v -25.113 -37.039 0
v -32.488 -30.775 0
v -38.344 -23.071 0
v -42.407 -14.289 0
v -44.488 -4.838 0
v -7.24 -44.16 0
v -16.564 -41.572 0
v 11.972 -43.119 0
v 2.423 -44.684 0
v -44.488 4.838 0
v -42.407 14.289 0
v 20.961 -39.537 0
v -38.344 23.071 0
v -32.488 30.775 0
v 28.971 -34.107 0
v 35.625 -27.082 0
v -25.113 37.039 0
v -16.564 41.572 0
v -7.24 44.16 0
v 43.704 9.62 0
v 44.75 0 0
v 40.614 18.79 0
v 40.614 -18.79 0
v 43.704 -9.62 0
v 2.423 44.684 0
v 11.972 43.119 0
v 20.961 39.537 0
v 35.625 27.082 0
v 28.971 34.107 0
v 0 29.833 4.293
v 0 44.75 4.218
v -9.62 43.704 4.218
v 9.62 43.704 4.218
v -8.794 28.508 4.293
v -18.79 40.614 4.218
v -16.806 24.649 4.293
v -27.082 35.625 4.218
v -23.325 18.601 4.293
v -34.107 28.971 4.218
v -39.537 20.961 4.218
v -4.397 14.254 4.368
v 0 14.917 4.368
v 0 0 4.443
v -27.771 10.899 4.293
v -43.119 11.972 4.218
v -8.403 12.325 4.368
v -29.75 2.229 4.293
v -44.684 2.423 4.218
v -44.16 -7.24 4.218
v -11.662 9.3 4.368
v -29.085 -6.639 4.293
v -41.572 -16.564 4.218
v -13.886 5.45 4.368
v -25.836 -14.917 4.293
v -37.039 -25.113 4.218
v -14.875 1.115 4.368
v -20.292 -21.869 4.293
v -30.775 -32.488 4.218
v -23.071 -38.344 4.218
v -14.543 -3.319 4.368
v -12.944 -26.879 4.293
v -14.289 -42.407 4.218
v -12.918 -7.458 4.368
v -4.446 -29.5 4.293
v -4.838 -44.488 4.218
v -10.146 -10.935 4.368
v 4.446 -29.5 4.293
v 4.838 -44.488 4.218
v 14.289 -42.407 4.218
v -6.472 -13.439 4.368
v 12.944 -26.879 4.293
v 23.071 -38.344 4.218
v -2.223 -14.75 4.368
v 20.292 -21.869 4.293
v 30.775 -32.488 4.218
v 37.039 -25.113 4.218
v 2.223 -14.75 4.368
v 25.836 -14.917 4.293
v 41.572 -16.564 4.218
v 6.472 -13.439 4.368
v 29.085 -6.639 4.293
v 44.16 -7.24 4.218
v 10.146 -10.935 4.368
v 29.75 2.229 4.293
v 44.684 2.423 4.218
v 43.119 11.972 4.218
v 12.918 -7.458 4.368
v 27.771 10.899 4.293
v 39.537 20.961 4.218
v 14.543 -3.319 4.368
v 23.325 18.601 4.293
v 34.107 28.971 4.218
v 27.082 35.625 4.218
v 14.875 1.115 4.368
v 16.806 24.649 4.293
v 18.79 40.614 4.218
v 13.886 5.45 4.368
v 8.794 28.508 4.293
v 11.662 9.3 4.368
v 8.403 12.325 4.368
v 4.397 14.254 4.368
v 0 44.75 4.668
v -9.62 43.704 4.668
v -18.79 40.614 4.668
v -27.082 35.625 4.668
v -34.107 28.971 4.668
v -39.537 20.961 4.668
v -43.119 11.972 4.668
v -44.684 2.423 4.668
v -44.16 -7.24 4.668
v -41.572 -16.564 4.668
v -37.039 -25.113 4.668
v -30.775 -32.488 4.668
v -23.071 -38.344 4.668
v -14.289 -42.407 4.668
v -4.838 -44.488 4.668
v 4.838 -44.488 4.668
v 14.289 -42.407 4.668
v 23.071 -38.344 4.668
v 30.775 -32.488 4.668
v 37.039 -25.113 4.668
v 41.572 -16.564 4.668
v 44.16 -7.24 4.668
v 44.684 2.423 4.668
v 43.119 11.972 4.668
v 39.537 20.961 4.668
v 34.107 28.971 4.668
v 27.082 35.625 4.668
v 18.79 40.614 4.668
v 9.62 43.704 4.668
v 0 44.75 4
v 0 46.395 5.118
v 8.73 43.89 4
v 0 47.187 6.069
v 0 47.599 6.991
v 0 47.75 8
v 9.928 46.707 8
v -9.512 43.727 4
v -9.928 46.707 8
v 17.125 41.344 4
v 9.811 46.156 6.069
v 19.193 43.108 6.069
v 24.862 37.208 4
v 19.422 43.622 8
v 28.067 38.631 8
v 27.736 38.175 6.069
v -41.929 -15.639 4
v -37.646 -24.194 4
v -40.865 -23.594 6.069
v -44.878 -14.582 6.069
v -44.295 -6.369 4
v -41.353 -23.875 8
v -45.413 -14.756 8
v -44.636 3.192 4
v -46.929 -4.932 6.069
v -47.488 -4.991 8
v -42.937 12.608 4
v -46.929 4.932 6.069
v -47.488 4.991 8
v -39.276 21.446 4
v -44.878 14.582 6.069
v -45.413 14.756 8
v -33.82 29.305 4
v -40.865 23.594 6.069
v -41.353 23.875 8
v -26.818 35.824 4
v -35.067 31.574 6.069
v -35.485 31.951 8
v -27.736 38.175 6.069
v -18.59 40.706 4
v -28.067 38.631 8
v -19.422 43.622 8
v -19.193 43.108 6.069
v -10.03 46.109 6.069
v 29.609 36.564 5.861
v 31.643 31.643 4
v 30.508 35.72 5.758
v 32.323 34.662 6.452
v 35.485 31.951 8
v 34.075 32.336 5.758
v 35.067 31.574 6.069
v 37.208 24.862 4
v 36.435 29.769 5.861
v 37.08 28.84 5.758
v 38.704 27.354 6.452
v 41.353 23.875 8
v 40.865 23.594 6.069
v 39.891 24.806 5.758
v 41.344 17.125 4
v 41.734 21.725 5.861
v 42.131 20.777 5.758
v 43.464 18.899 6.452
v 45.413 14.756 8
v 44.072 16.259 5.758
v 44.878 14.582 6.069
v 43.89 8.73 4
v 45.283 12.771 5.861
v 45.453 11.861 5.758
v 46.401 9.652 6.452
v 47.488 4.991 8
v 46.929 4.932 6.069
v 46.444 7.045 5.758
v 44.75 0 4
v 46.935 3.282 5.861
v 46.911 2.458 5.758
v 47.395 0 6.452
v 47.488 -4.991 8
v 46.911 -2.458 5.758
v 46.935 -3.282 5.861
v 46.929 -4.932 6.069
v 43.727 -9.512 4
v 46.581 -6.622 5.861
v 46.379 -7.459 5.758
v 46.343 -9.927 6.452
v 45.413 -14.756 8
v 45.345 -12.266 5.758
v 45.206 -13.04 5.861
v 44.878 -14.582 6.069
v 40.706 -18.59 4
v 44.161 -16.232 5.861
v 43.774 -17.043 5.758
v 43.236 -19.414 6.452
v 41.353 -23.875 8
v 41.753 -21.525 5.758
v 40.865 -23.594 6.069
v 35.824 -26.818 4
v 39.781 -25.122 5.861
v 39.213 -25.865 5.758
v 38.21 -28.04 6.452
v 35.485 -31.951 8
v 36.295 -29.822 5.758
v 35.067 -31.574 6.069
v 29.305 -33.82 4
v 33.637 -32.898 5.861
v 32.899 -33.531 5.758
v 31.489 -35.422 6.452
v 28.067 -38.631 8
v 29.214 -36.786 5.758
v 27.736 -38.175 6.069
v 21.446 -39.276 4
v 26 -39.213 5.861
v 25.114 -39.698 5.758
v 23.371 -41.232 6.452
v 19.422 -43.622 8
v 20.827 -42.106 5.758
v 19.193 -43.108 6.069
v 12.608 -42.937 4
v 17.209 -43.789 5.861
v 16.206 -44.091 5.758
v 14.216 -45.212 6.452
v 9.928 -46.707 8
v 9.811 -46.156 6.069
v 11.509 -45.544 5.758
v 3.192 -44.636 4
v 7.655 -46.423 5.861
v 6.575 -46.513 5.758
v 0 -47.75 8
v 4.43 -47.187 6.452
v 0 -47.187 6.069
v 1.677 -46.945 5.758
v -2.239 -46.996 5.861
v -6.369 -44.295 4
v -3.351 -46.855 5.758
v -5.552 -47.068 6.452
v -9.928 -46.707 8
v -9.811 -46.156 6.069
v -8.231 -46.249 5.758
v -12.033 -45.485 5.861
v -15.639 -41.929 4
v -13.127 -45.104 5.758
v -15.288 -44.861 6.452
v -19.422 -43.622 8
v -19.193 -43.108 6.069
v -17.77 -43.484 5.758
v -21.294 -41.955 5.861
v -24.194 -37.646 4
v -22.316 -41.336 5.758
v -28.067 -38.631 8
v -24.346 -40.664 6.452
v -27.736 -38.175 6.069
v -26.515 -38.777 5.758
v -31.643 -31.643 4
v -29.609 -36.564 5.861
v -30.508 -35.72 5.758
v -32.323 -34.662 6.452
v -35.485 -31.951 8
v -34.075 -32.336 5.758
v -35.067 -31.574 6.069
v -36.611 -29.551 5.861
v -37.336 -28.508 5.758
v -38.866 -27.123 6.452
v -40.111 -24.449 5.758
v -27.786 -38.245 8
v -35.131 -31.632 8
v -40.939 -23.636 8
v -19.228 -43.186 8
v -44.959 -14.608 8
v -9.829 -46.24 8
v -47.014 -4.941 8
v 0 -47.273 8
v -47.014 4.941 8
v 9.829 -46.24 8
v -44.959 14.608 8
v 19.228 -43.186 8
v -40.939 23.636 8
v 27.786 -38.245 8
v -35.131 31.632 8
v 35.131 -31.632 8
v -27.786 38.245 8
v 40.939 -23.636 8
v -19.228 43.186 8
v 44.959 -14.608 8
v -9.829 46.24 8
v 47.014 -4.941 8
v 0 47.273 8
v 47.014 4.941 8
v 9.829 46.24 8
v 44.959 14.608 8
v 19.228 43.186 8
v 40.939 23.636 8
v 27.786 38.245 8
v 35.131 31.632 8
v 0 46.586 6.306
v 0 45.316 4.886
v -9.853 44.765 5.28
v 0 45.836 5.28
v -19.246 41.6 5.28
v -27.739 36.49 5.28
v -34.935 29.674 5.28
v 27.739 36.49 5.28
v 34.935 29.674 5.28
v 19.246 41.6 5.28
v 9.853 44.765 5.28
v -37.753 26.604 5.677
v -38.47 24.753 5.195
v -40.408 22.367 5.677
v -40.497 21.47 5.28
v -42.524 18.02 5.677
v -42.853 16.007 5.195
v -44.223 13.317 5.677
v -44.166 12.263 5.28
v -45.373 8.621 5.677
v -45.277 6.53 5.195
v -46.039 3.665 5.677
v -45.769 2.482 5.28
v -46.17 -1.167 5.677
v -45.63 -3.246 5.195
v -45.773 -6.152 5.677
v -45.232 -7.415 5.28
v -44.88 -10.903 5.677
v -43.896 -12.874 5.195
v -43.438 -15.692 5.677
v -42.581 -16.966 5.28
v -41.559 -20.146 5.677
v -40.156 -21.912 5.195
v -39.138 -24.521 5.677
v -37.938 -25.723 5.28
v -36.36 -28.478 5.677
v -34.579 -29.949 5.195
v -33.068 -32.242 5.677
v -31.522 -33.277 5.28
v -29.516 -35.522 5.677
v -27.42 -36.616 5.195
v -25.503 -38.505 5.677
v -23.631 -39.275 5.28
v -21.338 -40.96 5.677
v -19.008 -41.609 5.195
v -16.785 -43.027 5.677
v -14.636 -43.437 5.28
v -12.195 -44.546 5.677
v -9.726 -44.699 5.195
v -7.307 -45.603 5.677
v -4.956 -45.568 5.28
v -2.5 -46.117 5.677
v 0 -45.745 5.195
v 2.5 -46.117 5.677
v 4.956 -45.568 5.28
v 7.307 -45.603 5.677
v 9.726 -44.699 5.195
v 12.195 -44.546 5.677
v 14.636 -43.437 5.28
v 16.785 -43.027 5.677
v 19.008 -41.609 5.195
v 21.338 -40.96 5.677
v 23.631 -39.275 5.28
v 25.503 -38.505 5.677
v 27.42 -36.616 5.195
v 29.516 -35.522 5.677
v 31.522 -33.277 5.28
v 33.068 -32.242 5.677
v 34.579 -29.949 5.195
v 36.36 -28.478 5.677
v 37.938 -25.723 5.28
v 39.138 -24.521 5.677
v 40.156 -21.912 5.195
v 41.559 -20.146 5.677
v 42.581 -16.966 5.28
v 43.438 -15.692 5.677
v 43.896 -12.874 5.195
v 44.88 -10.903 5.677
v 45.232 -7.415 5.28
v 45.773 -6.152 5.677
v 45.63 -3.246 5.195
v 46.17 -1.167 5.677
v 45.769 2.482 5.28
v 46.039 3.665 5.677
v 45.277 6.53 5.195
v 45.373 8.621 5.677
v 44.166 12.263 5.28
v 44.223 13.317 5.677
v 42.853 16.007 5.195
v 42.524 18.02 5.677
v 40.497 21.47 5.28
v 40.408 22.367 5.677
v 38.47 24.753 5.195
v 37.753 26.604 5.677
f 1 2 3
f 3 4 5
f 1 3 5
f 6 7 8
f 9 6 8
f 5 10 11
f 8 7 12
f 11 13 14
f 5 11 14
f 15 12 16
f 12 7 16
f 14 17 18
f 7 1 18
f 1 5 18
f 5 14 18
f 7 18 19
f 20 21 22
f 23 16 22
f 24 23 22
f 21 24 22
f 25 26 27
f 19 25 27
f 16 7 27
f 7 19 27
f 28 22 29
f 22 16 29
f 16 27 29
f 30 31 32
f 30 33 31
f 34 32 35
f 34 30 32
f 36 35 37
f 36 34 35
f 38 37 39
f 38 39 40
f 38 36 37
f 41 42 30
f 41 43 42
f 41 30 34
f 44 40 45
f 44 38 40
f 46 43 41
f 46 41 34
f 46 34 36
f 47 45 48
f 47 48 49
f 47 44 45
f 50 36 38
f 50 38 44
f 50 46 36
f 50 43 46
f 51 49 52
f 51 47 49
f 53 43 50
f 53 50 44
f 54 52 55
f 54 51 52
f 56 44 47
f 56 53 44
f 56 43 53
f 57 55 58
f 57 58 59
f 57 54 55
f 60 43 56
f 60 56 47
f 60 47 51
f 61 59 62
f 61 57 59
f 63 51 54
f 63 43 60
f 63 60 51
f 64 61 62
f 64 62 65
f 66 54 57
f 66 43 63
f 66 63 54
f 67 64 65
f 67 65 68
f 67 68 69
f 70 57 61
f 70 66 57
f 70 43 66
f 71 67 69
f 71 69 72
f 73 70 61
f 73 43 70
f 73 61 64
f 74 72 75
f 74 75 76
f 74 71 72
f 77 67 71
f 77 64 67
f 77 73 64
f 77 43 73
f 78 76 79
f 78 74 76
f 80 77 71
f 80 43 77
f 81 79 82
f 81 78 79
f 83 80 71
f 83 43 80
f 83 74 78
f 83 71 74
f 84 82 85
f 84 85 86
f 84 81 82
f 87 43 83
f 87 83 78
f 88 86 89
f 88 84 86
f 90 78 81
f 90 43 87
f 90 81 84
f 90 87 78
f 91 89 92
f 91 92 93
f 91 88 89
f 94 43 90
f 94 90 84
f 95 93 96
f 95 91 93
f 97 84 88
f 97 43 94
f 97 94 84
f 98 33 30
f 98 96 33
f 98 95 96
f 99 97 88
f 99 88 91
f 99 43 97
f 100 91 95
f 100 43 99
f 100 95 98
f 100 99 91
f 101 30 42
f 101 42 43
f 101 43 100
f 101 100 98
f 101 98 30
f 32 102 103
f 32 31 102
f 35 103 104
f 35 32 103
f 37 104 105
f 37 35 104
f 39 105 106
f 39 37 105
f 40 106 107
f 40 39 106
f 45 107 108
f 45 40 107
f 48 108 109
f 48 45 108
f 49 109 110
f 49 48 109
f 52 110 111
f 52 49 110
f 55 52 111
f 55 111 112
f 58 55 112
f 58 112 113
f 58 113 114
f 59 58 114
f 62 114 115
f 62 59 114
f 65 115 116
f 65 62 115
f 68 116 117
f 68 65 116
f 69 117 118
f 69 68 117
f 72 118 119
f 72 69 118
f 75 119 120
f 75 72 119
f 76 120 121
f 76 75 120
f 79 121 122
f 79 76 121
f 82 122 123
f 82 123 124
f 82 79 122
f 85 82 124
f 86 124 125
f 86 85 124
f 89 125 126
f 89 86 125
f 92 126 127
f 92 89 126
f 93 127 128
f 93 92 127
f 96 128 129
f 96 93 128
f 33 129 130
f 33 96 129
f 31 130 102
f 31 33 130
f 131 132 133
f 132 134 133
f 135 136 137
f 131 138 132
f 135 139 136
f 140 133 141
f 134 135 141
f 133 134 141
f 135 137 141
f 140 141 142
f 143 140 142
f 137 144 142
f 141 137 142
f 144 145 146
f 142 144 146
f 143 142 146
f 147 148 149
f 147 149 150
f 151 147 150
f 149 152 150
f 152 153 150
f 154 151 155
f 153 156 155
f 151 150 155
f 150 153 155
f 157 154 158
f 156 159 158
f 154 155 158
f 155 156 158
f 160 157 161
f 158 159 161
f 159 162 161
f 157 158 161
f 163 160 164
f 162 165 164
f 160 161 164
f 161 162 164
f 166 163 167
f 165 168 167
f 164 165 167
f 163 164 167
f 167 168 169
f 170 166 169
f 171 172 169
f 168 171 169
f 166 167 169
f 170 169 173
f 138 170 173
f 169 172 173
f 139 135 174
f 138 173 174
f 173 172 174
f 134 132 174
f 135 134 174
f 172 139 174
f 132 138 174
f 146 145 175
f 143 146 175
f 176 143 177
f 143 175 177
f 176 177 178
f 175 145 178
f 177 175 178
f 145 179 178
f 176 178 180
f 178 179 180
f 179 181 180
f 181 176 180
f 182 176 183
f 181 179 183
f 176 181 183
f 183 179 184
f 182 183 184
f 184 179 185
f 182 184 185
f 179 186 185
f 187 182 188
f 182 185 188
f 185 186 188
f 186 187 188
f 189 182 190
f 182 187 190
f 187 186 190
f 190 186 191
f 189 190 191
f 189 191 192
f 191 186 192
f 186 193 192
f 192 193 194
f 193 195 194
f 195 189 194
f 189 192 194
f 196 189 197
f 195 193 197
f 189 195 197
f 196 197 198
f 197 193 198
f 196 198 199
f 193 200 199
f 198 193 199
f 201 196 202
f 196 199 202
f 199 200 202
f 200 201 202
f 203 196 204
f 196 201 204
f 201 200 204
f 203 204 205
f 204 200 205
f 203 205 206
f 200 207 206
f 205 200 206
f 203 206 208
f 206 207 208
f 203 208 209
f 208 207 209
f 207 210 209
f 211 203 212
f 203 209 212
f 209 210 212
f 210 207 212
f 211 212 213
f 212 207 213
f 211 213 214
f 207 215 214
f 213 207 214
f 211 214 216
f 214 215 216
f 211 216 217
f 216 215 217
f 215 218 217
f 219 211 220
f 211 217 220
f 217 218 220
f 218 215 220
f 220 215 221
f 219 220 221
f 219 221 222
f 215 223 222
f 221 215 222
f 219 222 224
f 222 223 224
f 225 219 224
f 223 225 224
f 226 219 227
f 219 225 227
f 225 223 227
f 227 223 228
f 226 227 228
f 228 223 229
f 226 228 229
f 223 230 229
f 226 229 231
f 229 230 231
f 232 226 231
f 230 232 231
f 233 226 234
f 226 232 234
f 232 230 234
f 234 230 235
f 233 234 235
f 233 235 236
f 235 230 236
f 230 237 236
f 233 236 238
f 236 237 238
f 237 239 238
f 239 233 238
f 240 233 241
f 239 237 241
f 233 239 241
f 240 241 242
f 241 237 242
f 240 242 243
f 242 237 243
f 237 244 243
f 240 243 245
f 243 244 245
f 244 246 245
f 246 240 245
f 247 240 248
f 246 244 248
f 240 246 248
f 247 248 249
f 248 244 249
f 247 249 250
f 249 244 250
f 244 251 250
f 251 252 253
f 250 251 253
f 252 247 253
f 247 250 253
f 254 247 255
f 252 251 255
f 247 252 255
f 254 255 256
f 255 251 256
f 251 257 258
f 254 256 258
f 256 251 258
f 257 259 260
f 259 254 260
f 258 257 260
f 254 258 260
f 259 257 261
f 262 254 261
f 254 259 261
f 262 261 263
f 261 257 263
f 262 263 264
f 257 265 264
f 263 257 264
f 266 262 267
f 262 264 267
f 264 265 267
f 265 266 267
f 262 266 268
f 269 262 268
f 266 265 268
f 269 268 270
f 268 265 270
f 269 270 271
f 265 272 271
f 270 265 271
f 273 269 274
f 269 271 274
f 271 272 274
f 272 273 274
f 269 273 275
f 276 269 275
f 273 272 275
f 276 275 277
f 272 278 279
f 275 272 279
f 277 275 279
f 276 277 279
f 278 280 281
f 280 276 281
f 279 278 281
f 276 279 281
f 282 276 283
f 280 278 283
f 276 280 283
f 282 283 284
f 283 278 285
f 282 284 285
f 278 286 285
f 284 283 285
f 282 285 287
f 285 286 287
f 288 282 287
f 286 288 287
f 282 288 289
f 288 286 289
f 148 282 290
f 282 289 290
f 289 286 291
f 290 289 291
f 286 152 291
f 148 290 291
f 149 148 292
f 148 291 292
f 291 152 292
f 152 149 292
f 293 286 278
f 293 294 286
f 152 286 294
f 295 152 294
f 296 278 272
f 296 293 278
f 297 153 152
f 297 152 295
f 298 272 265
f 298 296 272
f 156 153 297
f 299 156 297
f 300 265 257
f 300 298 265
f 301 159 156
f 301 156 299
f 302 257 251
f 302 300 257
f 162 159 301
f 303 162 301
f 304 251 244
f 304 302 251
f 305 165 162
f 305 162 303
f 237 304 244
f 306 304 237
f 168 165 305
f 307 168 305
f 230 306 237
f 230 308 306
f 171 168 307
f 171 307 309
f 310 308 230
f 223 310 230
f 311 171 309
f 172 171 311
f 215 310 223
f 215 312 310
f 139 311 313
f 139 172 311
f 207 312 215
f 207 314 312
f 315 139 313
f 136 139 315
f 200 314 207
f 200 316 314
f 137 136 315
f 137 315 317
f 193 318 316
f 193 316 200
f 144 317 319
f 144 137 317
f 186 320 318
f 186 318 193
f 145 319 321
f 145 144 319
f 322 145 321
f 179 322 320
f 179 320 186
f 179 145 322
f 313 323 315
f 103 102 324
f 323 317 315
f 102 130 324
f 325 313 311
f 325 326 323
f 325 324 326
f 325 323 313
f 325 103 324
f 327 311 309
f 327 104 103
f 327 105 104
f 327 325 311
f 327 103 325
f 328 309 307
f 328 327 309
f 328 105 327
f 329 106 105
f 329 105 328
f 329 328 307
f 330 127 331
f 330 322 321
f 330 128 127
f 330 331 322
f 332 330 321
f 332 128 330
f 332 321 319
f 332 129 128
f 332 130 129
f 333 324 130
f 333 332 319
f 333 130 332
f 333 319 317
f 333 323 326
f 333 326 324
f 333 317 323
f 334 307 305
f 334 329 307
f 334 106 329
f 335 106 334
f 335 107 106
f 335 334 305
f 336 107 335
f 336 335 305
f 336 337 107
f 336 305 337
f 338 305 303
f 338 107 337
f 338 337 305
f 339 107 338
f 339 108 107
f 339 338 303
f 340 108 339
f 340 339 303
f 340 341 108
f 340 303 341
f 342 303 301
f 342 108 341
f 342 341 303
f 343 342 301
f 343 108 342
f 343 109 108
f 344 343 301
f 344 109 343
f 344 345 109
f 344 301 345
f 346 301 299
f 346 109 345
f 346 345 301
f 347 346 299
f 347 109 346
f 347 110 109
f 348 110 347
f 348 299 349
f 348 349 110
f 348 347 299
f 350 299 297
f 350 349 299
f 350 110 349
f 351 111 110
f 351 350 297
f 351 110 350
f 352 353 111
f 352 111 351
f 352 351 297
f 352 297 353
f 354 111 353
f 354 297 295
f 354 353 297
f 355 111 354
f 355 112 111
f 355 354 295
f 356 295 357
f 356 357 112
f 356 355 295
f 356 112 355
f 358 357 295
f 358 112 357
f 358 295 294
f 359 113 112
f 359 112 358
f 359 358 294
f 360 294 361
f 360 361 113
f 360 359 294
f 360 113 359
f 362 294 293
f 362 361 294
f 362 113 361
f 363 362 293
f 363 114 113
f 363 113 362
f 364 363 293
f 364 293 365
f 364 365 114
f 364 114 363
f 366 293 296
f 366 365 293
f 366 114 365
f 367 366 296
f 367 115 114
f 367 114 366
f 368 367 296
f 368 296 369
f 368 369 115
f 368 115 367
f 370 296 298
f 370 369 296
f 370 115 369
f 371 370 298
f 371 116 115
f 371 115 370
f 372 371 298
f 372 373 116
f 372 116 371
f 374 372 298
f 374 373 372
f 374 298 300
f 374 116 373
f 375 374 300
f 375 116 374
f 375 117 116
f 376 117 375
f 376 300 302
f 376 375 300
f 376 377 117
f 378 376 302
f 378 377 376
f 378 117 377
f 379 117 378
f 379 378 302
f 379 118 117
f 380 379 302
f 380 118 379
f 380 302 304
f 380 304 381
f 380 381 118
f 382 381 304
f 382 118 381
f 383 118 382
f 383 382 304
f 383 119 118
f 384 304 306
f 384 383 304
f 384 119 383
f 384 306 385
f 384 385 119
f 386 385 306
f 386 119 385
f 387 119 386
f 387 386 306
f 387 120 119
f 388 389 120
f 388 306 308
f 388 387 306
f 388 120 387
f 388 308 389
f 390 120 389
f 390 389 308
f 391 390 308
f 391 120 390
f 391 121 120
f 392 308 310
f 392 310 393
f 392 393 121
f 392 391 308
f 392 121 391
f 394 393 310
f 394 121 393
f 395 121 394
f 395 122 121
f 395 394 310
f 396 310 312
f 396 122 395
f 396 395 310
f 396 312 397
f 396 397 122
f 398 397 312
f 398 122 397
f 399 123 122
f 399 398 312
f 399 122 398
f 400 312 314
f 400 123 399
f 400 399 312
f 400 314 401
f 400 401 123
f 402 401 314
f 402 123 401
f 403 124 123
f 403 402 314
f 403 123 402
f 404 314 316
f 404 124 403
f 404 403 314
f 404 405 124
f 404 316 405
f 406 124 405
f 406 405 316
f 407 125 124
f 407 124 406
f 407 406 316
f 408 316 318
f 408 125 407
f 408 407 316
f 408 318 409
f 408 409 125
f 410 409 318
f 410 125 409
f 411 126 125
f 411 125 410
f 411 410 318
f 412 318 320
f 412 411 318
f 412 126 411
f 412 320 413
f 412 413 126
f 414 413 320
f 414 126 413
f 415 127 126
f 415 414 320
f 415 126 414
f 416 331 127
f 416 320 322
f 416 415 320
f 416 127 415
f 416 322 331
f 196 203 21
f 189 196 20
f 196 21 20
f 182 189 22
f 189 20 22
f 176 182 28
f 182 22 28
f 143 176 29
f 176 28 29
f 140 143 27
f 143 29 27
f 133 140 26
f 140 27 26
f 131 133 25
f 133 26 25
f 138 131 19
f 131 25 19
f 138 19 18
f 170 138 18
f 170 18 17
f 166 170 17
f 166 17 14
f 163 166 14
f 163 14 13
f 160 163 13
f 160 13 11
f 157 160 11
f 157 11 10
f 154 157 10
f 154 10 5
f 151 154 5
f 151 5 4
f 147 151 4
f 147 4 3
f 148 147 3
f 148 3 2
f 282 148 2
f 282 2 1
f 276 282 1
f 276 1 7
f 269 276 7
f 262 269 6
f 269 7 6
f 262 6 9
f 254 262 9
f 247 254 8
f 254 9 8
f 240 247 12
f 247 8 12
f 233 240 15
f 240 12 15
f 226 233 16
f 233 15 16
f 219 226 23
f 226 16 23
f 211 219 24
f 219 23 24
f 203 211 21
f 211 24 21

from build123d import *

# Parameters (mm, degrees)
SKETCH1_R           = 44.75
BOSS_EXTRUDE1_DEPTH = 4
SKETCH2_R           = 47.75
BOSS_EXTRUDE2_DEPTH = 4


with BuildPart() as part:
    # Sketch1 → Boss-Extrude1 (new body)
    with BuildSketch(Plane.XY):
        Circle(SKETCH1_R)
    extrude(amount=BOSS_EXTRUDE1_DEPTH)

    # Sketch2 → Boss-Extrude2 (add)
    with BuildSketch(Plane.XY.offset(4)):
        Circle(SKETCH2_R)
    extrude(amount=BOSS_EXTRUDE2_DEPTH)

    # Sketch3 → Cut-Revolve1 (revolve, cut)
    with BuildSketch(Plane(origin=(0, 0, 0), x_dir=(0, 0, -1), z_dir=(1, 0, 0))):
        with BuildLine():
            Line((-4, 47.75), (-4, 44.75))
            add(Edge.make_bspline(
                [(-4, 44.75), (-5.51655106, 47.70034682), (-8, 47.75)],
                knots=[0, 0, 0, 0.96689788, 0.96689788, 0.96689788], degree=2))
            Line((-8, 47.75), (-4, 47.75))
        make_face()
    revolve(axis=Axis((0, 0, 14.618090142), (0, 0, -1)), mode=Mode.SUBTRACT)

    # Sketch4 → Cut-Revolve3 (revolve, cut)
    with BuildSketch(Plane(origin=(0, 0, 0), x_dir=(0, 0, -1), z_dir=(1, 0, 0))):
        with BuildLine():
            Line((-4.667863656, 44.75), (-4.217612647, 44.75))
            Line((-4.217612647, 44.75), (-4.442738152, 0))
            Line((-4.442738152, 0), (-8, 0))
            Line((-8, 0), (-8, 47.272851402))
            add(Edge.make_bspline(
                [(-8, 47.272851402), (-5.020669257, 46.35865801), (-4.667863656, 44.75)],
                knots=[0, 0, 0, 0.52721511, 0.52721511, 0.52721511], degree=2))
        make_face()
    revolve(axis=Axis((0, 0, 4.442738152), (0, 0, 1)), mode=Mode.SUBTRACT)


solid = part.part
